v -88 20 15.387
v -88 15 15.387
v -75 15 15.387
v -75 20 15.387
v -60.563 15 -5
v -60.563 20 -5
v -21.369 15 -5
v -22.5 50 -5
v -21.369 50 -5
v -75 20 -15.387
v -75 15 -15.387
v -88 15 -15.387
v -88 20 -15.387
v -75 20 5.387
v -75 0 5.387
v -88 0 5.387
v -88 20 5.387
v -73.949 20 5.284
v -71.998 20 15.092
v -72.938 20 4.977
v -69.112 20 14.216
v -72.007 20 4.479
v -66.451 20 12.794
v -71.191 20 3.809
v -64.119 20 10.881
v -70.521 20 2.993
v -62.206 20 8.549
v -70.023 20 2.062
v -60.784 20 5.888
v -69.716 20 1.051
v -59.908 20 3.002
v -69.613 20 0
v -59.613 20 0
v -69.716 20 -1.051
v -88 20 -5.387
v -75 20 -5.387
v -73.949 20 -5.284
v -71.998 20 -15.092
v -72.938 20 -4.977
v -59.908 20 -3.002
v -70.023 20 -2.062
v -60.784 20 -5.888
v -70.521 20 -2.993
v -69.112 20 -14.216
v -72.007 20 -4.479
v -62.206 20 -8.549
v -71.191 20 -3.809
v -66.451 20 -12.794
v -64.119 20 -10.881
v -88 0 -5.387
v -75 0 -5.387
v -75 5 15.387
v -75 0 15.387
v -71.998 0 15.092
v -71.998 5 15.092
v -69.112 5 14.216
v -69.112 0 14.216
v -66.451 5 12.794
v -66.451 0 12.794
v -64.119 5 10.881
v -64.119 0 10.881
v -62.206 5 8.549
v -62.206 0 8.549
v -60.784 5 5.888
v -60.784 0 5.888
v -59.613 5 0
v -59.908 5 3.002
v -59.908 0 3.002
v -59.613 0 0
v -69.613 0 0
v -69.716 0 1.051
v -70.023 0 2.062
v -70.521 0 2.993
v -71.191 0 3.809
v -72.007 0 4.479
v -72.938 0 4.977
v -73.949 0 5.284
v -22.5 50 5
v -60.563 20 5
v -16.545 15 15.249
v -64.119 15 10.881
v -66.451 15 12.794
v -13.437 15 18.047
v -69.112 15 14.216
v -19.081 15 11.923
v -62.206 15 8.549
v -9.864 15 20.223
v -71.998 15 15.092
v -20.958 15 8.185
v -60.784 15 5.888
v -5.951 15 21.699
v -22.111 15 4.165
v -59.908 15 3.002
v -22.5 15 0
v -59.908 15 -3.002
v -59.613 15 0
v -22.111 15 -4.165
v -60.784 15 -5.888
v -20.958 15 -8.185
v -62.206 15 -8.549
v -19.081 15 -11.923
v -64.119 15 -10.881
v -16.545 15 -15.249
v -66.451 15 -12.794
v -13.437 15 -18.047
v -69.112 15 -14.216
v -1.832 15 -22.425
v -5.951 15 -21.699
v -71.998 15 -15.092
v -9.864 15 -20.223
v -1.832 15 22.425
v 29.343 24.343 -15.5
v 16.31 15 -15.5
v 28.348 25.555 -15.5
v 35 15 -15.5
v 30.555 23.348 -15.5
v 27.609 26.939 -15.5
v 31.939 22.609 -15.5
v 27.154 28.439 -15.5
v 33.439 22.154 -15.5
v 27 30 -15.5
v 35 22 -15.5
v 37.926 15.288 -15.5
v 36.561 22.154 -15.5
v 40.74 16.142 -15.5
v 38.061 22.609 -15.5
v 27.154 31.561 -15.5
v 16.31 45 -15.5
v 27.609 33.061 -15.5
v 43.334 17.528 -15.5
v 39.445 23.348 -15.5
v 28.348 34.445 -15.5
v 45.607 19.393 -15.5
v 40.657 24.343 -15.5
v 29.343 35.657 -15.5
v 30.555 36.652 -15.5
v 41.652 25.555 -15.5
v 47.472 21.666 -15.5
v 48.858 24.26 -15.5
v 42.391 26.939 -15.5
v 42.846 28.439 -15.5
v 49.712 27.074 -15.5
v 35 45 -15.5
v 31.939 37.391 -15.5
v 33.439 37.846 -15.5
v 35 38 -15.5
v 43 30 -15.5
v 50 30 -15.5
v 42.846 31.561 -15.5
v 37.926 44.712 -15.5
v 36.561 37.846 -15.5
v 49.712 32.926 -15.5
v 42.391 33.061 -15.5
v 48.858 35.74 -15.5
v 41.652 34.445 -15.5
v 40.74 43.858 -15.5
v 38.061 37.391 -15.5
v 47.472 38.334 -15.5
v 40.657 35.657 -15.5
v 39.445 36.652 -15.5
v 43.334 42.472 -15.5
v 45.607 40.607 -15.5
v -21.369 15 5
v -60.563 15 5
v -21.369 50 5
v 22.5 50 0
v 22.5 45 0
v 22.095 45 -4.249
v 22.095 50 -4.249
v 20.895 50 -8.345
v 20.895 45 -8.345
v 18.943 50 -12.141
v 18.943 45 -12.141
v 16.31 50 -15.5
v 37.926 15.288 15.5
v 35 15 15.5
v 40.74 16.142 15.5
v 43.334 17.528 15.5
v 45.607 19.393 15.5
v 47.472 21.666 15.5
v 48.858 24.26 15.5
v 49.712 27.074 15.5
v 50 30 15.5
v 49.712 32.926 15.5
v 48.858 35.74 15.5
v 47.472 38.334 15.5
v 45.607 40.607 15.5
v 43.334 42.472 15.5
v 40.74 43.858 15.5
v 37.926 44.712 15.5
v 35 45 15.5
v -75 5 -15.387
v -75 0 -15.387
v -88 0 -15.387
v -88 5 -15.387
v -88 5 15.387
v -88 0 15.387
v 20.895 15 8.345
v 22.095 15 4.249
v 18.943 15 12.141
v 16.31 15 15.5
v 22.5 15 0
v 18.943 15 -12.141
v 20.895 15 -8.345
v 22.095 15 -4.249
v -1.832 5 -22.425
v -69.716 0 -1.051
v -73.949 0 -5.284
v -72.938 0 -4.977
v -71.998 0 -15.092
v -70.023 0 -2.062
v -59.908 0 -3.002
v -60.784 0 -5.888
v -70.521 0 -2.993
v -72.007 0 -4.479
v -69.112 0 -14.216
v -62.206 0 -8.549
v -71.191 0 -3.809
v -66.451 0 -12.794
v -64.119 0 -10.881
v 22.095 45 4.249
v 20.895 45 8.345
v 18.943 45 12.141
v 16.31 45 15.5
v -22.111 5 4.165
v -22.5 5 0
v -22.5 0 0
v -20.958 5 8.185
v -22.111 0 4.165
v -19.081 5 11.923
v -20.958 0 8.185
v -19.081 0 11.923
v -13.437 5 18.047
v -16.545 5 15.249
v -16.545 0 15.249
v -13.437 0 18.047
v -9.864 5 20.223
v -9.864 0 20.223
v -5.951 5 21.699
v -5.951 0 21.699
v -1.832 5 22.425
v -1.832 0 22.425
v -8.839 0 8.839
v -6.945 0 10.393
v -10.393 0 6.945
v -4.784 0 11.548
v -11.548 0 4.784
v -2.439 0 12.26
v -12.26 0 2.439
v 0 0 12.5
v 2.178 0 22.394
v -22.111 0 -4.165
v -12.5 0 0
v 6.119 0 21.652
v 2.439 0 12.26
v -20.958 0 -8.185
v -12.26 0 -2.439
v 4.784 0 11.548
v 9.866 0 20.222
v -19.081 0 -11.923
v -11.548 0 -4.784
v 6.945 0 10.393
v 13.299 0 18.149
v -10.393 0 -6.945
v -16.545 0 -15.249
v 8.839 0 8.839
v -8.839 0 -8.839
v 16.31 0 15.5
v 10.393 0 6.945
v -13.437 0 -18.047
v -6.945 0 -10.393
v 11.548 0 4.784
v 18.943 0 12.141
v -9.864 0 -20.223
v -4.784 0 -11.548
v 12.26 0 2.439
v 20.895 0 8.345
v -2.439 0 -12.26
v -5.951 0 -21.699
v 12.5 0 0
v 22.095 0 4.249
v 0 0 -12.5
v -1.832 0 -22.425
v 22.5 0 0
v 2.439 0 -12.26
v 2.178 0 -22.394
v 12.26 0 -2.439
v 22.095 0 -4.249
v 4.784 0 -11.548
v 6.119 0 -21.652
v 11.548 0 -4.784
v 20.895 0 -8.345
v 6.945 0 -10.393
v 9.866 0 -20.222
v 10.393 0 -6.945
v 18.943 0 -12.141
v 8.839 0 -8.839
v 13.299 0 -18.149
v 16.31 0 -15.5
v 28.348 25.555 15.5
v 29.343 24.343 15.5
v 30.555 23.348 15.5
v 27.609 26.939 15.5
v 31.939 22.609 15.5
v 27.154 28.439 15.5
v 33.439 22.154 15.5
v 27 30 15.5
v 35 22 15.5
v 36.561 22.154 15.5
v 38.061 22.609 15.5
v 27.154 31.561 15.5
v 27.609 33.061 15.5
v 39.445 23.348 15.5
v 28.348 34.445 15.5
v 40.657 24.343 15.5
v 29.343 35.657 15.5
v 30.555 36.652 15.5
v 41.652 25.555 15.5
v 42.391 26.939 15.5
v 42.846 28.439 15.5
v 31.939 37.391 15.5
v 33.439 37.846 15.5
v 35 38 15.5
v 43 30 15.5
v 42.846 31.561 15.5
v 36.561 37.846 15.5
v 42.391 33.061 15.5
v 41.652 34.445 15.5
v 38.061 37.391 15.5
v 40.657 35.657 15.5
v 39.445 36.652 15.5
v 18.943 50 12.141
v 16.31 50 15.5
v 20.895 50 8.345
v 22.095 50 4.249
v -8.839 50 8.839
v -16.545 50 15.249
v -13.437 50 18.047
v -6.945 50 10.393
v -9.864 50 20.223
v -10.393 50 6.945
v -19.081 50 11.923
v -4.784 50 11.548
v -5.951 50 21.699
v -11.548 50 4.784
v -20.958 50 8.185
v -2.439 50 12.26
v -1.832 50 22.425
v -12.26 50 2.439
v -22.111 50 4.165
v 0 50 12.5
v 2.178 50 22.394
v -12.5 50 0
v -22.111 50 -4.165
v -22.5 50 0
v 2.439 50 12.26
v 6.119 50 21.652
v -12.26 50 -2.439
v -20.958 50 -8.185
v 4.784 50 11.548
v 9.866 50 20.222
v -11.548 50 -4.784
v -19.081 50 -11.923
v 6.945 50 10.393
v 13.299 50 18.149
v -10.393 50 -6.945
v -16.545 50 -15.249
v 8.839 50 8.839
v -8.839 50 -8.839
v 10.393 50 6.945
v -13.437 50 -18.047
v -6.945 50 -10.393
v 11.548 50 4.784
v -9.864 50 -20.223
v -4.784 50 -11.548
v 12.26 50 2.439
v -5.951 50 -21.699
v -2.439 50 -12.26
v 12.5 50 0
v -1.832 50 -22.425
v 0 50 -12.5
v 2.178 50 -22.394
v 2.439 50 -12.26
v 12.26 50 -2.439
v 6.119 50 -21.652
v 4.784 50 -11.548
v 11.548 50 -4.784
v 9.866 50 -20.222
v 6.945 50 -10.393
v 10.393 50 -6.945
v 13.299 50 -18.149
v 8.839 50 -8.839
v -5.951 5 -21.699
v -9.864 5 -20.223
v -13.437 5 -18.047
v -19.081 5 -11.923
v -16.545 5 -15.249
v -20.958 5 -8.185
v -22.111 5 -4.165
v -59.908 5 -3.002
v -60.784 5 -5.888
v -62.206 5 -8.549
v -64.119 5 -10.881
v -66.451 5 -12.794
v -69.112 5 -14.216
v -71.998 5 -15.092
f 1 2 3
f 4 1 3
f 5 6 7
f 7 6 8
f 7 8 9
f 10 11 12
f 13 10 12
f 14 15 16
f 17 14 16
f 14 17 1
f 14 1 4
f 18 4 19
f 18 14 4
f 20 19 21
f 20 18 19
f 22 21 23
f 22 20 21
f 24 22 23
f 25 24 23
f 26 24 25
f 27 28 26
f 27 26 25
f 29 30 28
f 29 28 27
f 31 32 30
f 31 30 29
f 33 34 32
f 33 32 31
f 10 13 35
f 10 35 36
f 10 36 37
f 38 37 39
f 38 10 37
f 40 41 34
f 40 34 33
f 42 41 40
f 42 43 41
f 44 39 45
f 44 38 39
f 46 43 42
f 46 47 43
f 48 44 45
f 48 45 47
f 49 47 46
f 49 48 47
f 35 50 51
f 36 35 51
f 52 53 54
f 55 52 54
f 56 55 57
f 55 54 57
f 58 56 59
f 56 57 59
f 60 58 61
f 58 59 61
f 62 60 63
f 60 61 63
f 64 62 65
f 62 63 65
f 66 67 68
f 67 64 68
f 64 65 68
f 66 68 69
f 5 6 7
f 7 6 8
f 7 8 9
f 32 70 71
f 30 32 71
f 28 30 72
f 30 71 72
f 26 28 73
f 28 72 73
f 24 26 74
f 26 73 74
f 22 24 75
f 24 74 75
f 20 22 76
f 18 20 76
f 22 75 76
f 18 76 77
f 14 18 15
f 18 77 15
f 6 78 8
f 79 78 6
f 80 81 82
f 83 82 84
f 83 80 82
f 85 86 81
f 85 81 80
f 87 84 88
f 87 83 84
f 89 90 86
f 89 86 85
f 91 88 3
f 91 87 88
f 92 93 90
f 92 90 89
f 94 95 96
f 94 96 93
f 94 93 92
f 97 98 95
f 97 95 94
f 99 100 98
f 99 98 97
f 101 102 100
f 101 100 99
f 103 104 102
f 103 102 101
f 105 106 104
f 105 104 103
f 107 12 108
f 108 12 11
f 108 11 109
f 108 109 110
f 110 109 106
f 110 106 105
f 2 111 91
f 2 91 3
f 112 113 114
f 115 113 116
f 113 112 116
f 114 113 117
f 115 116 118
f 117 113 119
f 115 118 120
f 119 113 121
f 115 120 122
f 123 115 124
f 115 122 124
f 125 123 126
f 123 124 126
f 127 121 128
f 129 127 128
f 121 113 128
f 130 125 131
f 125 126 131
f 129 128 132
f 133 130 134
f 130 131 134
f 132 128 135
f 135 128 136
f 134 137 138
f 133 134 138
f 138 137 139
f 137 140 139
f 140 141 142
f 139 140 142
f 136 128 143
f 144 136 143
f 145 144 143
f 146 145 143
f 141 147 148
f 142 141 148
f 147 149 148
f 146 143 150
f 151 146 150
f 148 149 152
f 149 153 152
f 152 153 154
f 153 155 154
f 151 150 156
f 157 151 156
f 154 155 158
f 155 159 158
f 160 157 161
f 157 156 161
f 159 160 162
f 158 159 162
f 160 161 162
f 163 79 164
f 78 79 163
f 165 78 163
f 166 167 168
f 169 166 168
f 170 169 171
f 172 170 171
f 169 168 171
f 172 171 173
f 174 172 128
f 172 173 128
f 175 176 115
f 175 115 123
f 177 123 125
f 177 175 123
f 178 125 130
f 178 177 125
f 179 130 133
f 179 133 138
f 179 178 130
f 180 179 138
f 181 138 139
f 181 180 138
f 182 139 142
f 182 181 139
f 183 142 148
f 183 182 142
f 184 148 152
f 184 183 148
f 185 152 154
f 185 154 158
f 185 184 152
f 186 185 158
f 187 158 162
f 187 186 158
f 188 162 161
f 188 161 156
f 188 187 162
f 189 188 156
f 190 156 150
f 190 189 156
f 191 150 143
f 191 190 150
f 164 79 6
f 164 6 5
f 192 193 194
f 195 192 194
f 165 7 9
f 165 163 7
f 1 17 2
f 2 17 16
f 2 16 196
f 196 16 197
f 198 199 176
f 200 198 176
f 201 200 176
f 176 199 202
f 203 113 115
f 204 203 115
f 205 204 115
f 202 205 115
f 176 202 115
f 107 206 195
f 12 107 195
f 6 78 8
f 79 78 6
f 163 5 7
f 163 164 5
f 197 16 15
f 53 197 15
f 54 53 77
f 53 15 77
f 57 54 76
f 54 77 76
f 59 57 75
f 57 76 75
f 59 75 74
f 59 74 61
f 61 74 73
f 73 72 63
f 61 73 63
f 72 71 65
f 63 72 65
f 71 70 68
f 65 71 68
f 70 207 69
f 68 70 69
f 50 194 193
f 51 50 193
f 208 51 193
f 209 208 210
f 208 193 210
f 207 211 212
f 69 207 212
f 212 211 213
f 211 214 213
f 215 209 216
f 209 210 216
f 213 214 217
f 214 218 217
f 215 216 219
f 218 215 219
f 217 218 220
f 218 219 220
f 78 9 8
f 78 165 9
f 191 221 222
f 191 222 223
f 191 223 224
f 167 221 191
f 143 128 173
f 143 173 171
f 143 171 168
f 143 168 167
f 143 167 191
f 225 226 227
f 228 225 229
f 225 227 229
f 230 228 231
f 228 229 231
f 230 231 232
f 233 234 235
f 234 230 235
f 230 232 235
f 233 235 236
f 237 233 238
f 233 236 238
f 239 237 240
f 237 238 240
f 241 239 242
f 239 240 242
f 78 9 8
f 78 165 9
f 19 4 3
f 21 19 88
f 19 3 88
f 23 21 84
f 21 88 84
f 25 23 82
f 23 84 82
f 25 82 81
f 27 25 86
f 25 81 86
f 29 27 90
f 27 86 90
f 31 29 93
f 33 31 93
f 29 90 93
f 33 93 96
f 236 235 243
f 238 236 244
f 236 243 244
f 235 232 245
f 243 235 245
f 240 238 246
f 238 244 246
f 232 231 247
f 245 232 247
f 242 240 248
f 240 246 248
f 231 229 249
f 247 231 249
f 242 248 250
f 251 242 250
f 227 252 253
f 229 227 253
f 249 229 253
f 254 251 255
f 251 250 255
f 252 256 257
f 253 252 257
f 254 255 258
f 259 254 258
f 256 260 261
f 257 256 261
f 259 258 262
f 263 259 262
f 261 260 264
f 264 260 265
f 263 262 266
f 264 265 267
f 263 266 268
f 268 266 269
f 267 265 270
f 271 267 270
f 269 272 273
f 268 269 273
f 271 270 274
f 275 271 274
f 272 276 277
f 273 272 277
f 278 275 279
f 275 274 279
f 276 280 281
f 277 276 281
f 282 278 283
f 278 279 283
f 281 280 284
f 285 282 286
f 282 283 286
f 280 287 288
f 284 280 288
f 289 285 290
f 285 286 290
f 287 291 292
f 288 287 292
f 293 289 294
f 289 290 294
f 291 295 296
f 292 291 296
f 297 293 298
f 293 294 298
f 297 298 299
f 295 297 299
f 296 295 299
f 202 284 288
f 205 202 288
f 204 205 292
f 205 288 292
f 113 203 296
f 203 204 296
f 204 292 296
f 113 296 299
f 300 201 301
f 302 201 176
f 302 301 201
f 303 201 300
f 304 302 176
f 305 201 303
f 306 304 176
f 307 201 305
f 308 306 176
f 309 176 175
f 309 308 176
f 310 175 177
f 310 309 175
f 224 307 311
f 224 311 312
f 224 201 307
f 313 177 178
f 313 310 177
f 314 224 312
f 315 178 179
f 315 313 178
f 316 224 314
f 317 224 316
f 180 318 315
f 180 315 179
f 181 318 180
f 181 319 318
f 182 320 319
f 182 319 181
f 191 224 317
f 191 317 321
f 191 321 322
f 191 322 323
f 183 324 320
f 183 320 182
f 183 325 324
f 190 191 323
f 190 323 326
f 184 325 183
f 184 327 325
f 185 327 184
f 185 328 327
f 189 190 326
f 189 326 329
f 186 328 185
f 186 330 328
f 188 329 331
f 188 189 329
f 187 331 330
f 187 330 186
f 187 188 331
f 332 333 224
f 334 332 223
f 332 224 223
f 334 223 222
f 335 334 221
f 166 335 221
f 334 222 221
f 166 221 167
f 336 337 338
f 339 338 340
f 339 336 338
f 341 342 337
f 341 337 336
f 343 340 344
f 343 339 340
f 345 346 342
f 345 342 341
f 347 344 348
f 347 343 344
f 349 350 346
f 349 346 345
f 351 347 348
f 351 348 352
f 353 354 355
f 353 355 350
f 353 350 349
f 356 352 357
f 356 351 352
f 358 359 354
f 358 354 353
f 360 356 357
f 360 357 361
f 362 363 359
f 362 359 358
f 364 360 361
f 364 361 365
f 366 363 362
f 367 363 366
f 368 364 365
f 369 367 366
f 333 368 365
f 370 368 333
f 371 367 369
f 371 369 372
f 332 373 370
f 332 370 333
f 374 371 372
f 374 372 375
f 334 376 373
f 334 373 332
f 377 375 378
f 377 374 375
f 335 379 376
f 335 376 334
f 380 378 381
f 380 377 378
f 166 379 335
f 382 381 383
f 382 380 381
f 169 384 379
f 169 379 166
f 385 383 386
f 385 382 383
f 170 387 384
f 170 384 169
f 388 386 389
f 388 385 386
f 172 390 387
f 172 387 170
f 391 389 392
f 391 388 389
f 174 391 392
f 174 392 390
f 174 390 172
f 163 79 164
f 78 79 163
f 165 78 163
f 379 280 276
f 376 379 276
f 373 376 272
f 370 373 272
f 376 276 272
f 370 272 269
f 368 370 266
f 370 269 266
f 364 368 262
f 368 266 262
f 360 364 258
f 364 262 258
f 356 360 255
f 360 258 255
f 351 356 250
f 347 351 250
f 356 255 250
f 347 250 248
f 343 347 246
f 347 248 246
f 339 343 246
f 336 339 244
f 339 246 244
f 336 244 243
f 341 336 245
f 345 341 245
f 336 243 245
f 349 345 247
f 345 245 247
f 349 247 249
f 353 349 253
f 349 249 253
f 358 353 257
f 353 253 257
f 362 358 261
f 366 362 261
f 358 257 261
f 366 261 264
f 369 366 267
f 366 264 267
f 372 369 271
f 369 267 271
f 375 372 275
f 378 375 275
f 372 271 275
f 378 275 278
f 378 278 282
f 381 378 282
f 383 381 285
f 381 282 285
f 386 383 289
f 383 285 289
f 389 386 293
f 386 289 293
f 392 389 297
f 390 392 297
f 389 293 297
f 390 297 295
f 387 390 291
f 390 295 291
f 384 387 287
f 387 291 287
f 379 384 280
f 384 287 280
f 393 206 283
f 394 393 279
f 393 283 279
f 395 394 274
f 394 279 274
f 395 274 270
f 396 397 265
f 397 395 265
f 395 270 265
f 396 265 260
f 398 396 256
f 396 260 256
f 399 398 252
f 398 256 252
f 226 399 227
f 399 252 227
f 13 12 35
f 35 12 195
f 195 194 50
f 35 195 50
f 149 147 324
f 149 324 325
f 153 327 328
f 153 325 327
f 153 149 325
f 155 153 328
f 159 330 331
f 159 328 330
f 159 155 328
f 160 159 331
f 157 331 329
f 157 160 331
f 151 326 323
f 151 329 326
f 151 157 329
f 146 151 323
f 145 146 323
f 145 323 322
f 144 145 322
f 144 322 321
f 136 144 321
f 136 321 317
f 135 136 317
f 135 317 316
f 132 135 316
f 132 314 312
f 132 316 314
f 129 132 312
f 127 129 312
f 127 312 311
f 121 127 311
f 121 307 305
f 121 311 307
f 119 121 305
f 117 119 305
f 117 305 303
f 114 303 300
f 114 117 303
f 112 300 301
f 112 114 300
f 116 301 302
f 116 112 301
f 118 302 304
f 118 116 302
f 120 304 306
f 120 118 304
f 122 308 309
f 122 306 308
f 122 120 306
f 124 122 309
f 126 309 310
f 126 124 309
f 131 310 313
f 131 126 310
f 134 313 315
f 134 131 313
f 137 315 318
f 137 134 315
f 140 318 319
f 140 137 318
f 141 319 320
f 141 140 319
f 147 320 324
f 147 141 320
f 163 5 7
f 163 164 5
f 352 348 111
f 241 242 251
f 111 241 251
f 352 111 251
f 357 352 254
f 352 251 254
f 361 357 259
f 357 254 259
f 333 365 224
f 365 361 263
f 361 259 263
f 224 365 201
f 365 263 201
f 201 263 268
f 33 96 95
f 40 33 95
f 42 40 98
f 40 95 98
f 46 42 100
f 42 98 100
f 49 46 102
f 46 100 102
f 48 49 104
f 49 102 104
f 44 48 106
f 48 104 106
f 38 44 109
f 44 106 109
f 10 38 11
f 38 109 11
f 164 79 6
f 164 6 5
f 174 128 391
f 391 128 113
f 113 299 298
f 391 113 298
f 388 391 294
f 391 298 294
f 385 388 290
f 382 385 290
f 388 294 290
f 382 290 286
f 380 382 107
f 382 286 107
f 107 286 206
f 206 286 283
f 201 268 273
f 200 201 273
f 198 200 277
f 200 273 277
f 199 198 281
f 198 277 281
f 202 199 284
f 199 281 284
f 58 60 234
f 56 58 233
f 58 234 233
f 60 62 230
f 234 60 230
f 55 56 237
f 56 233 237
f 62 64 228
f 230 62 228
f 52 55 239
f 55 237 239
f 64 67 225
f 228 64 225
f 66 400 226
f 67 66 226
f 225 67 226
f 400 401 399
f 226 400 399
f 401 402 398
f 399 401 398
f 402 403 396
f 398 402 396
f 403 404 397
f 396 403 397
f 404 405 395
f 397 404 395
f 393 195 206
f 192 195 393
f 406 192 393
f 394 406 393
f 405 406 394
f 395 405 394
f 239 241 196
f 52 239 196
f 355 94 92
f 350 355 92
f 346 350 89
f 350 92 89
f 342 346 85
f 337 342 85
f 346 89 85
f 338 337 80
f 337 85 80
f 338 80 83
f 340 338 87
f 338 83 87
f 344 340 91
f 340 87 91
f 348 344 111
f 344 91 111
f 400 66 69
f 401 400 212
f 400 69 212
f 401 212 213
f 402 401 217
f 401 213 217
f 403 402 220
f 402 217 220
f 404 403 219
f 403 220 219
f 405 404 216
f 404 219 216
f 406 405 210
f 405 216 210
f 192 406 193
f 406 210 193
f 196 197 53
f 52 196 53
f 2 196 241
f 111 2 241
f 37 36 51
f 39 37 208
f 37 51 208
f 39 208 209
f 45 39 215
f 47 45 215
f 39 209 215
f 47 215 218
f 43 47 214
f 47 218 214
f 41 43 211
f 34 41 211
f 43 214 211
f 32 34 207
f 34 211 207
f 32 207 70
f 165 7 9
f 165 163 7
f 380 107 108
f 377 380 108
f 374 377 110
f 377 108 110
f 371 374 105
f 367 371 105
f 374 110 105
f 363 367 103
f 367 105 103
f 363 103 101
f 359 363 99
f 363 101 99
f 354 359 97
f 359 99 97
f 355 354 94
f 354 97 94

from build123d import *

# Parameters (mm, degrees)
SKETCH1_R               = 22.5
SKETCH1_R_2             = 12.5
BOSS_EXTRUDE1_DEPTH     = 50
BOSS_EXTRUDE2_DEPTH     = 20
BOSS_EXTRUDE4_START     = 5
BOSS_EXTRUDE4_DEPTH     = 10
BOSS_EXTRUDE5_START     = 15
BOSS_EXTRUDE5_DEPTH     = 30
BOSS_EXTRUDE9_DEPTH     = 5
BOSS_EXTRUDE10_DEPTH    = 31
CUT_EXTRUDE1_DEPTH      = 109.111054014
CUT_EXTRUDE1_DEPTH_BACK = 109.111054014
SKETCH13_R              = 8
BOSS_EXTRUDE11_DEPTH    = 5


with BuildPart() as part:
    # Sketch1 → Boss-Extrude1 (new body)
    with BuildSketch(Plane(origin=(0, 0, 0), x_dir=(1, 0, 0), z_dir=(0, 1, 0))):
        Circle(SKETCH1_R)
        Circle(SKETCH1_R_2, mode=Mode.SUBTRACT)
    extrude(amount=BOSS_EXTRUDE1_DEPTH)



with BuildPart() as body_2:
    # Sketch1<4> → Boss-Extrude2 (new body)
    with BuildSketch(Plane(origin=(0, 0, 0), x_dir=(1, 0, 0), z_dir=(0, 1, 0))):
        with BuildLine():
            ThreePointArc((-74.999999995, -15.38737848), (-59.61262152, 3e-09), (-75, 15.38737848))
            Line((-75, 15.38737848), (-88, 15.38737848))
            Line((-88, 15.38737848), (-88, 5.38737848))
            Line((-88, 5.38737848), (-75, 5.38737848))
            ThreePointArc((-75, 5.38737848), (-69.61262152, 0), (-75, -5.38737848))
            Line((-75, -5.38737848), (-87.999999995, -5.38737848))
            Line((-87.999999995, -5.38737848), (-87.999999995, -15.38737848))
            Line((-87.999999995, -15.38737848), (-74.999999995, -15.38737848))
        make_face()
    extrude(amount=BOSS_EXTRUDE2_DEPTH)


with BuildPart() as part_1:
    add(part.part)

    add(body_2.part)  # Boss-Extrude4 merges body 2
    # Sketch1<6> → Boss-Extrude4 (add)
    with BuildSketch(Plane(origin=(0, 0, 0), x_dir=(1, 0, 0), z_dir=(0, 1, 0)).offset(BOSS_EXTRUDE4_START)):
        with BuildLine():
            ThreePointArc((-1.831625627, -22.425323801), (-22.5, 0), (-1.831625627, 22.425323801))
            Line((-1.831625627, 22.425323801), (-88, 15.38737848))
            Line((-88, 15.38737848), (-75, 15.38737848))
            ThreePointArc((-75, 15.38737848), (-59.61262152, 3e-09), (-74.999999995, -15.38737848))
            Line((-74.999999995, -15.38737848), (-87.999999995, -15.38737848))
            Line((-87.999999995, -15.38737848), (-1.831625627, -22.425323801))
        make_face()
    extrude(amount=BOSS_EXTRUDE4_DEPTH)

    # Sketch1<7> → Boss-Extrude5 (add)
    with BuildSketch(Plane(origin=(0, 0, 0), x_dir=(1, 0, 0), z_dir=(0, 1, 0)).offset(BOSS_EXTRUDE5_START)):
        with BuildLine():
            ThreePointArc((16.30950643, 15.5), (22.5, 0), (16.30950643, -15.5))
            Line((16.30950643, -15.5), (35, -15.5))
            Line((35, -15.5), (35, 15.5))
            Line((35, 15.5), (16.30950643, 15.5))
        make_face()
    extrude(amount=BOSS_EXTRUDE5_DEPTH)

    # Sketch12 → Boss-Extrude10 (add)
    with BuildSketch(Plane.XY.offset(15.5)):
        with BuildLine():
            Line((35, 45), (35, 15))
            ThreePointArc((35, 15), (50, 30), (35, 45))
        make_face()
    extrude(amount=-BOSS_EXTRUDE10_DEPTH)

    # Sketch13 → Cut-Extrude1 (cut, two sides: drawn at the far end of the back side and taken through both)
    with BuildSketch(Plane.XY.offset(15.5).offset(-CUT_EXTRUDE1_DEPTH_BACK)):
        with Locations((35, 30)):
            Circle(SKETCH13_R)
    extrude(amount=CUT_EXTRUDE1_DEPTH + CUT_EXTRUDE1_DEPTH_BACK, mode=Mode.SUBTRACT)


with BuildPart() as body_2_2:
    # Sketch9 → Boss-Extrude9 (new, symmetric)
    with BuildSketch(Plane.XY):
        Polygon((-21.368534633, 50), (-22.5, 50), (-60.563403799, 20), (-60.563403799, 15), (-21.368534633, 15), align=None)
    extrude(amount=BOSS_EXTRUDE9_DEPTH, both=True)


with BuildPart() as body_3:
    # Sketch9<2> → Boss-Extrude11 (new, symmetric)
    with BuildSketch(Plane.XY):
        Polygon((-21.368534633, 50), (-22.5, 50), (-60.563403799, 20), (-60.563403799, 15), (-21.368534633, 15), align=None)
    extrude(amount=BOSS_EXTRUDE11_DEPTH, both=True)


solid = Compound([part_1.part, body_2_2.part, body_3.part])
